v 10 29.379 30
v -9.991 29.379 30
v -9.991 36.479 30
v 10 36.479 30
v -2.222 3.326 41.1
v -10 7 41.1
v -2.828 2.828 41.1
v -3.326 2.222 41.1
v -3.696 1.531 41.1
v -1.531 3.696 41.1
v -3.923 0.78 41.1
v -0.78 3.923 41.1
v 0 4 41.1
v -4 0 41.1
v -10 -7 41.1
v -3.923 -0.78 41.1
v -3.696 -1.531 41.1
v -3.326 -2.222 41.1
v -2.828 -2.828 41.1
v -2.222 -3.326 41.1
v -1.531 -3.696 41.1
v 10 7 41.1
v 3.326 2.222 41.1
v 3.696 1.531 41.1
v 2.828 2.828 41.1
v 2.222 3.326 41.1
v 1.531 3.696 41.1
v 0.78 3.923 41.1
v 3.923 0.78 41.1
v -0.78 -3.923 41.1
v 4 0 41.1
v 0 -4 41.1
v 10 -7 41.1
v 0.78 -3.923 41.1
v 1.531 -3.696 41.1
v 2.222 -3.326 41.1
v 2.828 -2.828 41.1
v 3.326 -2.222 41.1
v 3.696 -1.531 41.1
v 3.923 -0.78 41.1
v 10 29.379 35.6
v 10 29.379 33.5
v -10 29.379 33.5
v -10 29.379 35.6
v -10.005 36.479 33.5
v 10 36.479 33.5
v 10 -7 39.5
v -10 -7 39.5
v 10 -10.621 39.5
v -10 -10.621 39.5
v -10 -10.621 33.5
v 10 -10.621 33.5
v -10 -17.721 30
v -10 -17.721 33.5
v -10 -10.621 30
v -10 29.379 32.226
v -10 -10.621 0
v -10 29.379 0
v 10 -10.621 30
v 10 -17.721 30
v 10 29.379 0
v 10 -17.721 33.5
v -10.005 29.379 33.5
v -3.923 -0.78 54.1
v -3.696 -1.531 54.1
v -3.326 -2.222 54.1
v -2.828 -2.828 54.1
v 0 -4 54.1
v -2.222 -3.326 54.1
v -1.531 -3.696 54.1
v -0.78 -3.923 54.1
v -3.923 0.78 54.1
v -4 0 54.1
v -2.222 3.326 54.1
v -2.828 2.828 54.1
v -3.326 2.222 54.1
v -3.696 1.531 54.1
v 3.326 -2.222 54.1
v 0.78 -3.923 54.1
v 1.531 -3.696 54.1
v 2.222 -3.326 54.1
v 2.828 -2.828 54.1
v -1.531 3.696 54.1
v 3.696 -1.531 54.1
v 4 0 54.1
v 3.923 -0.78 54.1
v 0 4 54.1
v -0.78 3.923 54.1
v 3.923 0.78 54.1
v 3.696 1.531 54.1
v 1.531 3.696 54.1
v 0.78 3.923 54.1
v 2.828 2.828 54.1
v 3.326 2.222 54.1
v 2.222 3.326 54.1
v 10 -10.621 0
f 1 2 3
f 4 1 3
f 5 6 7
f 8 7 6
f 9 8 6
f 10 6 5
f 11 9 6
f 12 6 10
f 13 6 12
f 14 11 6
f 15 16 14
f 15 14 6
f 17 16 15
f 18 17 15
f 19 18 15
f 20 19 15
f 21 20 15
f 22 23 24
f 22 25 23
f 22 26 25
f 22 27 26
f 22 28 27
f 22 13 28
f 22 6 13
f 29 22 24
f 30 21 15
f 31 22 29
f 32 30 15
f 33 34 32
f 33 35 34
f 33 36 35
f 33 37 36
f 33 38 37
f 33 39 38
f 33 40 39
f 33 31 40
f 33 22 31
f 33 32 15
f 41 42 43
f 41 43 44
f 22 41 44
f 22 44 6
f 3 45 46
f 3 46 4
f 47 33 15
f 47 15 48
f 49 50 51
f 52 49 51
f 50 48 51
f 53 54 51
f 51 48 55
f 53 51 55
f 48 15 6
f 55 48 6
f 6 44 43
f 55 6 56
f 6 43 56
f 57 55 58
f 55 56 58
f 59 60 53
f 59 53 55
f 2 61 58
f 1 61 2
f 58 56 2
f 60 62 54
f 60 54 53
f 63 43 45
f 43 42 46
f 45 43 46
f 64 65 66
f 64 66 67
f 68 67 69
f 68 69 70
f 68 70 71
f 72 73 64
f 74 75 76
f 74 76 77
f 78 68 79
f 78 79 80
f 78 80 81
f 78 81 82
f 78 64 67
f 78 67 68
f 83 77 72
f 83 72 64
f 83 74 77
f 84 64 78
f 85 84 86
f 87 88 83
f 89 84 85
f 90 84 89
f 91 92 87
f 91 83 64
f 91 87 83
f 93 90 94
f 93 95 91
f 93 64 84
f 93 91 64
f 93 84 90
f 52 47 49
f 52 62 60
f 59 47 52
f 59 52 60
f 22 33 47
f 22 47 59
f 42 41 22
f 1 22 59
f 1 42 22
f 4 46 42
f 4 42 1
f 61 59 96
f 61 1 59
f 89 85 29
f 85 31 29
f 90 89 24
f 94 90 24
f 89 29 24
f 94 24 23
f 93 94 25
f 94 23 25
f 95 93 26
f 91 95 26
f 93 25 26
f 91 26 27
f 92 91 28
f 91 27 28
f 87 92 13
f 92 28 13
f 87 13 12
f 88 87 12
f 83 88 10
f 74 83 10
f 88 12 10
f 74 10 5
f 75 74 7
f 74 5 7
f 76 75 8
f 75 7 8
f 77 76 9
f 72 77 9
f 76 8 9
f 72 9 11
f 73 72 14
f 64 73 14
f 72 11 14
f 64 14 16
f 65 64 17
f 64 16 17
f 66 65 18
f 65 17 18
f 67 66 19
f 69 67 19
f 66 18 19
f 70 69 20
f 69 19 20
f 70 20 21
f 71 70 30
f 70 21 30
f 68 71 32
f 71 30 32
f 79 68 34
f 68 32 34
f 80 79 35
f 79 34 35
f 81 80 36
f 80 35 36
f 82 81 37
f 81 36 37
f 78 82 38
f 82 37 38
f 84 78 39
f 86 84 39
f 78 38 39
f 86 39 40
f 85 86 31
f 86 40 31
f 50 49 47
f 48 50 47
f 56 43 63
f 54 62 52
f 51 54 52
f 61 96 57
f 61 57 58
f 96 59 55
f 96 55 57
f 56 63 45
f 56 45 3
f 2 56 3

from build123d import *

# Parameters (mm, degrees)
BOSS_EXTRUDE1_DEPTH = 19.999999553
SKETCH2_W           = 29.999999329
SKETCH2_H           = 7.099999115
CUT_EXTRUDE1_DEPTH  = 55.335457568
SKETCH3_W           = 7.599998266
SKETCH3_H           = 7.099999115
CUT_EXTRUDE2_DEPTH  = 55.335457568
SKETCH4_W           = 1.599997282
SKETCH4_H           = 3.620889969
CUT_EXTRUDE3_DEPTH  = 55.335457568
BOSS_EXTRUDE2_REACH = 56.335
SKETCH6_W           = 3.500001505
SKETCH6_H           = 7.10000284
SKETCH7_R           = 4
BOSS_EXTRUDE3_DEPTH = 7
MOVE_FACE2_BY       = 6


with BuildPart() as part:
    # Sketch1 → Boss-Extrude1 (new body)
    with BuildSketch(Plane(origin=(10, 0, 0), x_dir=(0, 0, -1), z_dir=(1, 0, 0))):
        Polygon((0, 29.379108921), (-35.59999913, 29.379108921), (-41.0999991, 7.000000216), (-41.0999991, -17.7208893), (0, -17.7208893), align=None)
    extrude(amount=-BOSS_EXTRUDE1_DEPTH)

    # Sketch2 → Cut-Extrude1 (cut, through all)
    with BuildSketch(Plane(origin=(10, 0, 0), x_dir=(0, 0, -1), z_dir=(1, 0, 0))):
        with Locations((-14.999999665, -14.170889742)):
            Rectangle(SKETCH2_W, SKETCH2_H)
    extrude(amount=-CUT_EXTRUDE1_DEPTH, mode=Mode.SUBTRACT)

    # Sketch3 → Cut-Extrude2 (cut, through all)
    with BuildSketch(Plane(origin=(10, 0, 0), x_dir=(0, 0, -1), z_dir=(1, 0, 0))):
        with Locations((-37.299999967, -14.170889742)):
            Rectangle(SKETCH3_W, SKETCH3_H)
    extrude(amount=-CUT_EXTRUDE2_DEPTH, mode=Mode.SUBTRACT)

    # Sketch4 → Cut-Extrude3 (cut, through all)
    with BuildSketch(Plane(origin=(10, 0, 0), x_dir=(0, 0, -1), z_dir=(1, 0, 0))):
        with Locations((-40.300000459, -8.810445201)):
            Rectangle(SKETCH4_W, SKETCH4_H)
    extrude(amount=-CUT_EXTRUDE3_DEPTH, mode=Mode.SUBTRACT)

    # Boss-Extrude2: up to this plane
    boss_extrude2_end = Plane(origin=(-9.873244788, 0, -0.038787862), z_dir=(-0.9999922832070416, 0, -0.003928552706520363))
    # Sketch6 → Boss-Extrude2 (add, up to the surface)
    with BuildSketch(Plane(origin=(10, 0, 0), x_dir=(0, 0, -1), z_dir=(1, 0, 0)), mode=Mode.PRIVATE) as boss_extrude2_sk1:
        with Locations((-31.750000082, 32.929110341)):
            Rectangle(SKETCH6_W, SKETCH6_H)
    boss_extrude2_tool1 = split(extrude(boss_extrude2_sk1.sketch, amount=-BOSS_EXTRUDE2_REACH, mode=Mode.PRIVATE), bisect_by=boss_extrude2_end, keep=Keep.BOTH, mode=Mode.PRIVATE)
    add(boss_extrude2_tool1.solids().sort_by_distance((10, 32.92911, 31.75))[0])

    # Sketch7 → Boss-Extrude3 (add)
    with BuildSketch(Plane.XY.offset(41.0999991)):
        Circle(SKETCH7_R)
    extrude(amount=BOSS_EXTRUDE3_DEPTH)

    # Move Face2: a face moved outward by 6.0
    extrude(part.faces().sort_by_distance((0, 0, 48.0999991))[0], amount=MOVE_FACE2_BY, dir=(0, 0, 1))


solid = part.part
